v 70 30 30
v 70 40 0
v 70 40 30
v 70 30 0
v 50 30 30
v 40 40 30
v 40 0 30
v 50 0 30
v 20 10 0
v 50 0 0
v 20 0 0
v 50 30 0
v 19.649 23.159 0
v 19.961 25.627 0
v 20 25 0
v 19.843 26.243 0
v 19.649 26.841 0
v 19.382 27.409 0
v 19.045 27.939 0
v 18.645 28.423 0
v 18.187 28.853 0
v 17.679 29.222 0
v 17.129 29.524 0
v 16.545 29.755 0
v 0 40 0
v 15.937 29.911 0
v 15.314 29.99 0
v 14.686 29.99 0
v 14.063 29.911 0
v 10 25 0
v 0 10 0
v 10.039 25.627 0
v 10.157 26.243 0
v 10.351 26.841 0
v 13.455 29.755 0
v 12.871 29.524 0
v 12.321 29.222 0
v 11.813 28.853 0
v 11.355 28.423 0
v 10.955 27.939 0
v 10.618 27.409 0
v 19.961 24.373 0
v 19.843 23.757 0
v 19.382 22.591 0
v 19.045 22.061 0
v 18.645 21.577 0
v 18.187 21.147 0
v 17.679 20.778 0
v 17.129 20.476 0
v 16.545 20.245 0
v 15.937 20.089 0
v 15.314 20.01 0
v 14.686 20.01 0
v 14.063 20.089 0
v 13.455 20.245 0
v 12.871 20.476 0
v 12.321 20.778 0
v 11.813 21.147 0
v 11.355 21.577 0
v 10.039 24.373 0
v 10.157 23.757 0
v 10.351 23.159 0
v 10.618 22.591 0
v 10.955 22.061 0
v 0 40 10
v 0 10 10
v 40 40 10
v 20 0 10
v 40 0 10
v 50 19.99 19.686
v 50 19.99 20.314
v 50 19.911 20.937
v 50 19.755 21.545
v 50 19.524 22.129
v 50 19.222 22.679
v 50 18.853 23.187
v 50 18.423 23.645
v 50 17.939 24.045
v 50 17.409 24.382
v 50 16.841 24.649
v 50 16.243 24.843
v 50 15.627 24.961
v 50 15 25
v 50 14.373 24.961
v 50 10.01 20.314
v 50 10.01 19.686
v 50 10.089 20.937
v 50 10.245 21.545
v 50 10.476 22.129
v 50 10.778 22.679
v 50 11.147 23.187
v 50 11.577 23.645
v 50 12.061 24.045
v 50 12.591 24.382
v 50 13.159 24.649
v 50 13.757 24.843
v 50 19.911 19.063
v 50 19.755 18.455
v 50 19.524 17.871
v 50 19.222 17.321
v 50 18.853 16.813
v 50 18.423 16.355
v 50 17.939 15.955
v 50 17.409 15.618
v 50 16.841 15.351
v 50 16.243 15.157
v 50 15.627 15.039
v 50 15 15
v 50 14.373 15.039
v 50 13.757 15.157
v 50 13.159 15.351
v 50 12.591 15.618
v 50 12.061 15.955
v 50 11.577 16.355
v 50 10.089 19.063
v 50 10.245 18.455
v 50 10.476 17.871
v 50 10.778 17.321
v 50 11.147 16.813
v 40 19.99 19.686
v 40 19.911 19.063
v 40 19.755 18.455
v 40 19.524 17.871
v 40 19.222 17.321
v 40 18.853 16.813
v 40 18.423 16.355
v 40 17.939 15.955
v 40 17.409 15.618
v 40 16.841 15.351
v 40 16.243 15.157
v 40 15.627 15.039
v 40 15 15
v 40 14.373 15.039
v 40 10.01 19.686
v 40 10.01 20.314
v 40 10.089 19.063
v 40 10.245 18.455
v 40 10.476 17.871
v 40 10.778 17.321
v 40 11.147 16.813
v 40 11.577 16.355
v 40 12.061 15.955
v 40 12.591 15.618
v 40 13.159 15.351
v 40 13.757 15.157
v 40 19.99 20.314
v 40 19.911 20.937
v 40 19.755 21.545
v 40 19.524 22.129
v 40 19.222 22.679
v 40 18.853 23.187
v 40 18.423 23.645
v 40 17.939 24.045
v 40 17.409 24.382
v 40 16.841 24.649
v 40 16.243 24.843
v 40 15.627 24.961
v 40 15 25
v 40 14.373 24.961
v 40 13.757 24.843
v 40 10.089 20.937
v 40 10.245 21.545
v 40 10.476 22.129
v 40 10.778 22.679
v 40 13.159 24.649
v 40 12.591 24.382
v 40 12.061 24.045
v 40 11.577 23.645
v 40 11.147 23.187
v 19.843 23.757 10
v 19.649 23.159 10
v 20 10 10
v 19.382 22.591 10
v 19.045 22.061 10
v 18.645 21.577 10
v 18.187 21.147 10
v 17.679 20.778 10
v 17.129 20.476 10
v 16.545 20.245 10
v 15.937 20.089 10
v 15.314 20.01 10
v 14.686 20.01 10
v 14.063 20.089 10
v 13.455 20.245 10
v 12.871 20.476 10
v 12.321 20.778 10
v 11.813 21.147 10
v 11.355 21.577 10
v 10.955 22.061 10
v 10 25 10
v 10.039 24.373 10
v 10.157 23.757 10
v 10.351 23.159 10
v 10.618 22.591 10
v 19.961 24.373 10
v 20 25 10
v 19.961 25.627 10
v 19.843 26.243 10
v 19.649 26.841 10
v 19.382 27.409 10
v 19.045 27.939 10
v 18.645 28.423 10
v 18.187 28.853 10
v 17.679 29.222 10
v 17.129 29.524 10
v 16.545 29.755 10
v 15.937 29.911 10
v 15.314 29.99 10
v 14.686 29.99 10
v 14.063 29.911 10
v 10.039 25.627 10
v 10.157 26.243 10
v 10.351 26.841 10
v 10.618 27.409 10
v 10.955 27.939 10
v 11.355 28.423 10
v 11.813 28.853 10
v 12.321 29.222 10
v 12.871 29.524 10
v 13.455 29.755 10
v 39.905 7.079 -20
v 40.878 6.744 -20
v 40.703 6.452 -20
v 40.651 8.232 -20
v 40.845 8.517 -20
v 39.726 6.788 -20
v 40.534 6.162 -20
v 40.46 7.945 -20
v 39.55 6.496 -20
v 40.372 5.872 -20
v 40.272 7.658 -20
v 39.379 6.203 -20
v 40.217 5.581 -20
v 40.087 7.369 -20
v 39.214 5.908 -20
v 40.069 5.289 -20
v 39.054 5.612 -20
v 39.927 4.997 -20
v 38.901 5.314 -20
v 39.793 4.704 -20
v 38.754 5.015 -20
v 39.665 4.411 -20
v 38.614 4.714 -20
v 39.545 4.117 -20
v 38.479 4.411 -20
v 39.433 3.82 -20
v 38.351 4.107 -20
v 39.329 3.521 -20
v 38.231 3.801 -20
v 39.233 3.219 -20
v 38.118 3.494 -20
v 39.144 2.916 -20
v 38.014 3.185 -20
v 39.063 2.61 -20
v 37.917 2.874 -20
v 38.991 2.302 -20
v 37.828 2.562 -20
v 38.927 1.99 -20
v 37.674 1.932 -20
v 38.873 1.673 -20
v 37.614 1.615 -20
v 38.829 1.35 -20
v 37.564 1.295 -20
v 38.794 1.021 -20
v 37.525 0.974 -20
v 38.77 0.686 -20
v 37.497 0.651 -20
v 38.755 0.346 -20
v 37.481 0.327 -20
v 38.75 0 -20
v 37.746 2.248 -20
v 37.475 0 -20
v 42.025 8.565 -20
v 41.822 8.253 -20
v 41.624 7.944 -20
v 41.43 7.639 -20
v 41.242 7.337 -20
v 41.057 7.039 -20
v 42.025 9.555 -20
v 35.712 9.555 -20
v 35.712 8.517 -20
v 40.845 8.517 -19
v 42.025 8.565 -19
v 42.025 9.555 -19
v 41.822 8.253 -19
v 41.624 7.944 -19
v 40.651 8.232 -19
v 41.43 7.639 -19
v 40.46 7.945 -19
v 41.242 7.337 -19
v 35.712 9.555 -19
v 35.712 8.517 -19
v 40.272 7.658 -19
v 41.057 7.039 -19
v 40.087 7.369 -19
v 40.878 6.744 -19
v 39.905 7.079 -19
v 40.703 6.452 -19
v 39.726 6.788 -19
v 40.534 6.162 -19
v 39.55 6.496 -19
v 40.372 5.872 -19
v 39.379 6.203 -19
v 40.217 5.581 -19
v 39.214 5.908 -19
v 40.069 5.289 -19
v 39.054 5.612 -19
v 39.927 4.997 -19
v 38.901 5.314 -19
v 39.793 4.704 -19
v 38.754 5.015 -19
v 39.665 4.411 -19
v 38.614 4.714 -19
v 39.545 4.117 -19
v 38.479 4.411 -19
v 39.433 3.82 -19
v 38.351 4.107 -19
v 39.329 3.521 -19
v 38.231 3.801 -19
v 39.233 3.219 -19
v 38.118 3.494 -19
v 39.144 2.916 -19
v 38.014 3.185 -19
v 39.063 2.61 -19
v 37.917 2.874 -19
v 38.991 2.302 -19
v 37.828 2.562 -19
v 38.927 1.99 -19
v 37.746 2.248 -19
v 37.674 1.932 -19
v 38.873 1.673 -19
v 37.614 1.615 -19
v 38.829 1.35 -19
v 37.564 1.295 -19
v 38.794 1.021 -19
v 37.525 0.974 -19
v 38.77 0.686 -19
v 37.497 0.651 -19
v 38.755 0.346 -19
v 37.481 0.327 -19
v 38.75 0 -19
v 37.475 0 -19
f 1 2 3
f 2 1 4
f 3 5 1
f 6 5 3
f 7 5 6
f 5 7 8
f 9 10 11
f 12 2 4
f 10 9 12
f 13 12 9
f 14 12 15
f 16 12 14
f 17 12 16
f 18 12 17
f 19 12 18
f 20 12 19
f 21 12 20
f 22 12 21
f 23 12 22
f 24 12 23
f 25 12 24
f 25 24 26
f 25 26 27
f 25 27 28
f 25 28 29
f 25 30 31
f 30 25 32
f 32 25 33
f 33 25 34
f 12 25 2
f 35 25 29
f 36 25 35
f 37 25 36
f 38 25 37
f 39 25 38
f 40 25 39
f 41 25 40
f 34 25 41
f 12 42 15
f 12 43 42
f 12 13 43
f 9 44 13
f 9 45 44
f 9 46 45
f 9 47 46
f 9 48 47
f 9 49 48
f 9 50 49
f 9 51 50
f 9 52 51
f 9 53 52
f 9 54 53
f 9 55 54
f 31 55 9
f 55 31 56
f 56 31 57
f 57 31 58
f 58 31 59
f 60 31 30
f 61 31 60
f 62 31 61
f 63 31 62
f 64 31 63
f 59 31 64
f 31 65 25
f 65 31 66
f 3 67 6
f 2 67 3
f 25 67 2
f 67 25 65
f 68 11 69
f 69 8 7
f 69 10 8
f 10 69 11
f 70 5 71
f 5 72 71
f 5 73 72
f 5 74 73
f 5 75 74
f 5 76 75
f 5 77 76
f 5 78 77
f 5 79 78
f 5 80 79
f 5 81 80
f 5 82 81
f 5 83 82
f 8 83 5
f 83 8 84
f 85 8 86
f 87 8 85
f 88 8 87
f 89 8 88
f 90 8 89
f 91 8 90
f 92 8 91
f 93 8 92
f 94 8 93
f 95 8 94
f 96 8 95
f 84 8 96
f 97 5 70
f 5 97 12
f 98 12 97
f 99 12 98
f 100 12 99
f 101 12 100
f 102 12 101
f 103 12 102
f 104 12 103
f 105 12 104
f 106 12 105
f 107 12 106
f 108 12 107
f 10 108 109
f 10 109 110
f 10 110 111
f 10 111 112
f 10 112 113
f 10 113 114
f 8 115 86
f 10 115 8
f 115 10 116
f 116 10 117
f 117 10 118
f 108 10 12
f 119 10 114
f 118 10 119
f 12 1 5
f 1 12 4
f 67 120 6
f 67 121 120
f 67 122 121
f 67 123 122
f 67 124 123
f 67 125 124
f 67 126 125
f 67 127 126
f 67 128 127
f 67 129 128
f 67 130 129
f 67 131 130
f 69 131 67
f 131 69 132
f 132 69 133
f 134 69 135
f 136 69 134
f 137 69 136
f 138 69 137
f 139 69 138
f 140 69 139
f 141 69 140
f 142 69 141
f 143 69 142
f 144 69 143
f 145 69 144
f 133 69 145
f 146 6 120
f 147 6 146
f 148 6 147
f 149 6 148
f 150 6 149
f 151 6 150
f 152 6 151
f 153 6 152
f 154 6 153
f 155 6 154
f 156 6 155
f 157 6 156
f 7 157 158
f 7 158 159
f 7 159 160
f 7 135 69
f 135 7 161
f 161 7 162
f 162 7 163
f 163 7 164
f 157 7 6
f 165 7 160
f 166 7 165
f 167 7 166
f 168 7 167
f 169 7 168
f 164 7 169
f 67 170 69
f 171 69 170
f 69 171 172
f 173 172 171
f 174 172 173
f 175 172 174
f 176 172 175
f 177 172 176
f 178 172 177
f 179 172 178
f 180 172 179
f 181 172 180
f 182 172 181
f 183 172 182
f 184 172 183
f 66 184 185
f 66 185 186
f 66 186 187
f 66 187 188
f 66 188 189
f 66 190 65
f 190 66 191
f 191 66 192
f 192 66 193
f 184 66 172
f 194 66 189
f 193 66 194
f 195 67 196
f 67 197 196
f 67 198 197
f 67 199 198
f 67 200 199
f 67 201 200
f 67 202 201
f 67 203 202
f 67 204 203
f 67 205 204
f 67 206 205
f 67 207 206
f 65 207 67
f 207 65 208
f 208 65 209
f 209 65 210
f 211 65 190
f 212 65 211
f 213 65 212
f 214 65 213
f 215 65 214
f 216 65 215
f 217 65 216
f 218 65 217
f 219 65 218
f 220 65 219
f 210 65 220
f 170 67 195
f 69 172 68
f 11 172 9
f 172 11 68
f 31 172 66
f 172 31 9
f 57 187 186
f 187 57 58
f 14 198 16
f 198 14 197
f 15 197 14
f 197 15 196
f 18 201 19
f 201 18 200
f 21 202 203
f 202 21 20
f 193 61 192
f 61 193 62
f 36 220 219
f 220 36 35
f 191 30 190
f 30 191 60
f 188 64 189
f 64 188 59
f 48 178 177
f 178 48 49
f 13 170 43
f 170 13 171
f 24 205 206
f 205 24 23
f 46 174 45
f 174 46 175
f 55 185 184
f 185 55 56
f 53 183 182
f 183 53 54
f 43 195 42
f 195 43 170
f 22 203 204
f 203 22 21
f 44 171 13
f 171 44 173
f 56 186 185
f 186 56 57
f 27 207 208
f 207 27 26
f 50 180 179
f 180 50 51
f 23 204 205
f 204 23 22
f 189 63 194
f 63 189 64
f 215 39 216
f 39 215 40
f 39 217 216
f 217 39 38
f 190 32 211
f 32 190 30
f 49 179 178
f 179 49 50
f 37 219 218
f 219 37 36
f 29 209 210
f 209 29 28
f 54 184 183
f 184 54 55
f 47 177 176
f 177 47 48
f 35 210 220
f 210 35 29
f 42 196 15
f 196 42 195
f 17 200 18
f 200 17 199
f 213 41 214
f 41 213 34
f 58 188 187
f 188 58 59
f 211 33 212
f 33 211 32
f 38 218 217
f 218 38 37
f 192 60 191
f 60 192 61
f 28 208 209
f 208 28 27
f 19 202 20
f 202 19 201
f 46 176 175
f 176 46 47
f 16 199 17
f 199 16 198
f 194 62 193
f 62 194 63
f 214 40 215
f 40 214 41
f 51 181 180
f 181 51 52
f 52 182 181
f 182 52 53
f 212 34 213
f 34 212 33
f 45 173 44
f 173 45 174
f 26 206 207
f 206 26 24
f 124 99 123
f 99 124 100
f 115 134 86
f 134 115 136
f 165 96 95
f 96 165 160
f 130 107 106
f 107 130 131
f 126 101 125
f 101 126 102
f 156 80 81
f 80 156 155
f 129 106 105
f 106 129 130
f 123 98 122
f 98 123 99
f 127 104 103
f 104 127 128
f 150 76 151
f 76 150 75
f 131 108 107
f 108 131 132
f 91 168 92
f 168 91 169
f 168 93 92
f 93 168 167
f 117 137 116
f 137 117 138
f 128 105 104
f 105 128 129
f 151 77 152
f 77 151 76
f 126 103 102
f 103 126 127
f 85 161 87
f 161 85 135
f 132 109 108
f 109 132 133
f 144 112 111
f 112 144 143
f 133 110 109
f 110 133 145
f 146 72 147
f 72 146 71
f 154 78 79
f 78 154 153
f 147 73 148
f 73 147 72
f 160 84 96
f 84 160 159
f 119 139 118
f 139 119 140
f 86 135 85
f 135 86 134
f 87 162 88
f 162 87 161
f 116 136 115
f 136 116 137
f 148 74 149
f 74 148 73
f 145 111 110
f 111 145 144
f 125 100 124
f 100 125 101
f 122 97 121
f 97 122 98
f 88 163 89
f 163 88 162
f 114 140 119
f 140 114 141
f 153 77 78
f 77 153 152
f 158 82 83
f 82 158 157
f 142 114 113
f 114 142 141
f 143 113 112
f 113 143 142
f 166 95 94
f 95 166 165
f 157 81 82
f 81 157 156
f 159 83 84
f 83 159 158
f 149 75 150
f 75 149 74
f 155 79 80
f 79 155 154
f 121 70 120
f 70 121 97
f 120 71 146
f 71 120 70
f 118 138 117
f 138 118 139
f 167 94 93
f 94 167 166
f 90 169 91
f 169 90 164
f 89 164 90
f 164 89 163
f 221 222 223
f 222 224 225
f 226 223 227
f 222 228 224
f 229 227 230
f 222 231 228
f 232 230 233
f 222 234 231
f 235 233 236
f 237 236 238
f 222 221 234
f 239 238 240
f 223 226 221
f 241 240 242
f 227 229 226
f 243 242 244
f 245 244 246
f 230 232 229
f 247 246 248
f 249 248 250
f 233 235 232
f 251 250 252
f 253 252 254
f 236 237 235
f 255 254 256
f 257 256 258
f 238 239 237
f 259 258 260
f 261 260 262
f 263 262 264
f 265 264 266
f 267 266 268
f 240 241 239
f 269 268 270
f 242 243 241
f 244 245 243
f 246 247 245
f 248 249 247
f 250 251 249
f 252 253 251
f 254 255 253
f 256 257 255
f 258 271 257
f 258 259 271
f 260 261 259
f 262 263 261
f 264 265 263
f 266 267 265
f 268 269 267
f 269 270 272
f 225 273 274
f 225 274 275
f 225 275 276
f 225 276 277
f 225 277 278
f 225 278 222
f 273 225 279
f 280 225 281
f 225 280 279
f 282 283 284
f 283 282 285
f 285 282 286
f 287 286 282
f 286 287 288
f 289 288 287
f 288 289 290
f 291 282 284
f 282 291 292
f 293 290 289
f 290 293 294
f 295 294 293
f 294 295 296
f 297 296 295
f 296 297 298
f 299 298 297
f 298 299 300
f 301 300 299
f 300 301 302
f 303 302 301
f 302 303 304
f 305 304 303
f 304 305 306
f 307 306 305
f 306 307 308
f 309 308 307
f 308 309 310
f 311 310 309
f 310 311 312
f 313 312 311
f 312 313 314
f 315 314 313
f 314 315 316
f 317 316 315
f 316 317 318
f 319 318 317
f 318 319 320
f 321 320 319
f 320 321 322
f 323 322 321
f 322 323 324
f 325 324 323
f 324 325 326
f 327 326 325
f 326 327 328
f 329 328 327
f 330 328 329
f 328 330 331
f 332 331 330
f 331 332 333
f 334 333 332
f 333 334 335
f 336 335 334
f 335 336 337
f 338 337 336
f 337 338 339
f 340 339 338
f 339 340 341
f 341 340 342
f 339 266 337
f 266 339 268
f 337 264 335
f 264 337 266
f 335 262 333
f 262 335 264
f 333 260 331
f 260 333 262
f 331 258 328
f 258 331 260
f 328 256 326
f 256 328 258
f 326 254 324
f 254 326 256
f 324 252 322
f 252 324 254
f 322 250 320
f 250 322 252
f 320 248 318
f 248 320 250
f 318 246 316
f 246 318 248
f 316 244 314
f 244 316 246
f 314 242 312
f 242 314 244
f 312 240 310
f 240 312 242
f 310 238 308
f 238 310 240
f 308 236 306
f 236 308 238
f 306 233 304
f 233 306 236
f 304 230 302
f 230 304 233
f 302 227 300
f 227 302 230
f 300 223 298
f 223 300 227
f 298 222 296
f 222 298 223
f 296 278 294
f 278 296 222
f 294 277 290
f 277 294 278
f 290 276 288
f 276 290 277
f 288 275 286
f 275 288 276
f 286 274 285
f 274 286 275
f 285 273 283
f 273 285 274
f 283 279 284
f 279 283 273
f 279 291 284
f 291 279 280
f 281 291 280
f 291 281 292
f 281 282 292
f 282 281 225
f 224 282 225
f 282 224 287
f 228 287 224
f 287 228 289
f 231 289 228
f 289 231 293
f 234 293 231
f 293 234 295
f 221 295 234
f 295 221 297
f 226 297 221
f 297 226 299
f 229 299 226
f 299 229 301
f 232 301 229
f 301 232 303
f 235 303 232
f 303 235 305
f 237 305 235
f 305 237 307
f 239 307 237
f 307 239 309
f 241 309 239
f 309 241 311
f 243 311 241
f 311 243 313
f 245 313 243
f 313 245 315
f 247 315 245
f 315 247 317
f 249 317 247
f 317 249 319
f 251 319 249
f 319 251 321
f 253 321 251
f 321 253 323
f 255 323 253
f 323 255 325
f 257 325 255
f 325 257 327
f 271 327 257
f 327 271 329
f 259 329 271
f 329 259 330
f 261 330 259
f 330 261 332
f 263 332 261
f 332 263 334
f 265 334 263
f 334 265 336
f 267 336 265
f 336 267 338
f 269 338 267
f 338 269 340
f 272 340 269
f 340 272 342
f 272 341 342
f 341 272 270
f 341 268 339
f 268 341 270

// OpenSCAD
$fn=50;

cw=70;
cd=40;
ch=30;
cy=10;

difference() {
    cube([cw,cd,ch]);
    translate([cw-20,0,0])
    cube([20,30,ch]);
    translate([0,0,10])
    cube([cw-30,cd,ch-10]);
    cube([20,10,10]);
    translate([15,25,0])
    cylinder(h=cy,d=cy);
    translate([40,15,ch-10])
    rotate([0,90,0])
    cylinder(h=cy,d=cy);
}
translate([cw/2,0,-20])
linear_extrude(height=1)
text("7");
